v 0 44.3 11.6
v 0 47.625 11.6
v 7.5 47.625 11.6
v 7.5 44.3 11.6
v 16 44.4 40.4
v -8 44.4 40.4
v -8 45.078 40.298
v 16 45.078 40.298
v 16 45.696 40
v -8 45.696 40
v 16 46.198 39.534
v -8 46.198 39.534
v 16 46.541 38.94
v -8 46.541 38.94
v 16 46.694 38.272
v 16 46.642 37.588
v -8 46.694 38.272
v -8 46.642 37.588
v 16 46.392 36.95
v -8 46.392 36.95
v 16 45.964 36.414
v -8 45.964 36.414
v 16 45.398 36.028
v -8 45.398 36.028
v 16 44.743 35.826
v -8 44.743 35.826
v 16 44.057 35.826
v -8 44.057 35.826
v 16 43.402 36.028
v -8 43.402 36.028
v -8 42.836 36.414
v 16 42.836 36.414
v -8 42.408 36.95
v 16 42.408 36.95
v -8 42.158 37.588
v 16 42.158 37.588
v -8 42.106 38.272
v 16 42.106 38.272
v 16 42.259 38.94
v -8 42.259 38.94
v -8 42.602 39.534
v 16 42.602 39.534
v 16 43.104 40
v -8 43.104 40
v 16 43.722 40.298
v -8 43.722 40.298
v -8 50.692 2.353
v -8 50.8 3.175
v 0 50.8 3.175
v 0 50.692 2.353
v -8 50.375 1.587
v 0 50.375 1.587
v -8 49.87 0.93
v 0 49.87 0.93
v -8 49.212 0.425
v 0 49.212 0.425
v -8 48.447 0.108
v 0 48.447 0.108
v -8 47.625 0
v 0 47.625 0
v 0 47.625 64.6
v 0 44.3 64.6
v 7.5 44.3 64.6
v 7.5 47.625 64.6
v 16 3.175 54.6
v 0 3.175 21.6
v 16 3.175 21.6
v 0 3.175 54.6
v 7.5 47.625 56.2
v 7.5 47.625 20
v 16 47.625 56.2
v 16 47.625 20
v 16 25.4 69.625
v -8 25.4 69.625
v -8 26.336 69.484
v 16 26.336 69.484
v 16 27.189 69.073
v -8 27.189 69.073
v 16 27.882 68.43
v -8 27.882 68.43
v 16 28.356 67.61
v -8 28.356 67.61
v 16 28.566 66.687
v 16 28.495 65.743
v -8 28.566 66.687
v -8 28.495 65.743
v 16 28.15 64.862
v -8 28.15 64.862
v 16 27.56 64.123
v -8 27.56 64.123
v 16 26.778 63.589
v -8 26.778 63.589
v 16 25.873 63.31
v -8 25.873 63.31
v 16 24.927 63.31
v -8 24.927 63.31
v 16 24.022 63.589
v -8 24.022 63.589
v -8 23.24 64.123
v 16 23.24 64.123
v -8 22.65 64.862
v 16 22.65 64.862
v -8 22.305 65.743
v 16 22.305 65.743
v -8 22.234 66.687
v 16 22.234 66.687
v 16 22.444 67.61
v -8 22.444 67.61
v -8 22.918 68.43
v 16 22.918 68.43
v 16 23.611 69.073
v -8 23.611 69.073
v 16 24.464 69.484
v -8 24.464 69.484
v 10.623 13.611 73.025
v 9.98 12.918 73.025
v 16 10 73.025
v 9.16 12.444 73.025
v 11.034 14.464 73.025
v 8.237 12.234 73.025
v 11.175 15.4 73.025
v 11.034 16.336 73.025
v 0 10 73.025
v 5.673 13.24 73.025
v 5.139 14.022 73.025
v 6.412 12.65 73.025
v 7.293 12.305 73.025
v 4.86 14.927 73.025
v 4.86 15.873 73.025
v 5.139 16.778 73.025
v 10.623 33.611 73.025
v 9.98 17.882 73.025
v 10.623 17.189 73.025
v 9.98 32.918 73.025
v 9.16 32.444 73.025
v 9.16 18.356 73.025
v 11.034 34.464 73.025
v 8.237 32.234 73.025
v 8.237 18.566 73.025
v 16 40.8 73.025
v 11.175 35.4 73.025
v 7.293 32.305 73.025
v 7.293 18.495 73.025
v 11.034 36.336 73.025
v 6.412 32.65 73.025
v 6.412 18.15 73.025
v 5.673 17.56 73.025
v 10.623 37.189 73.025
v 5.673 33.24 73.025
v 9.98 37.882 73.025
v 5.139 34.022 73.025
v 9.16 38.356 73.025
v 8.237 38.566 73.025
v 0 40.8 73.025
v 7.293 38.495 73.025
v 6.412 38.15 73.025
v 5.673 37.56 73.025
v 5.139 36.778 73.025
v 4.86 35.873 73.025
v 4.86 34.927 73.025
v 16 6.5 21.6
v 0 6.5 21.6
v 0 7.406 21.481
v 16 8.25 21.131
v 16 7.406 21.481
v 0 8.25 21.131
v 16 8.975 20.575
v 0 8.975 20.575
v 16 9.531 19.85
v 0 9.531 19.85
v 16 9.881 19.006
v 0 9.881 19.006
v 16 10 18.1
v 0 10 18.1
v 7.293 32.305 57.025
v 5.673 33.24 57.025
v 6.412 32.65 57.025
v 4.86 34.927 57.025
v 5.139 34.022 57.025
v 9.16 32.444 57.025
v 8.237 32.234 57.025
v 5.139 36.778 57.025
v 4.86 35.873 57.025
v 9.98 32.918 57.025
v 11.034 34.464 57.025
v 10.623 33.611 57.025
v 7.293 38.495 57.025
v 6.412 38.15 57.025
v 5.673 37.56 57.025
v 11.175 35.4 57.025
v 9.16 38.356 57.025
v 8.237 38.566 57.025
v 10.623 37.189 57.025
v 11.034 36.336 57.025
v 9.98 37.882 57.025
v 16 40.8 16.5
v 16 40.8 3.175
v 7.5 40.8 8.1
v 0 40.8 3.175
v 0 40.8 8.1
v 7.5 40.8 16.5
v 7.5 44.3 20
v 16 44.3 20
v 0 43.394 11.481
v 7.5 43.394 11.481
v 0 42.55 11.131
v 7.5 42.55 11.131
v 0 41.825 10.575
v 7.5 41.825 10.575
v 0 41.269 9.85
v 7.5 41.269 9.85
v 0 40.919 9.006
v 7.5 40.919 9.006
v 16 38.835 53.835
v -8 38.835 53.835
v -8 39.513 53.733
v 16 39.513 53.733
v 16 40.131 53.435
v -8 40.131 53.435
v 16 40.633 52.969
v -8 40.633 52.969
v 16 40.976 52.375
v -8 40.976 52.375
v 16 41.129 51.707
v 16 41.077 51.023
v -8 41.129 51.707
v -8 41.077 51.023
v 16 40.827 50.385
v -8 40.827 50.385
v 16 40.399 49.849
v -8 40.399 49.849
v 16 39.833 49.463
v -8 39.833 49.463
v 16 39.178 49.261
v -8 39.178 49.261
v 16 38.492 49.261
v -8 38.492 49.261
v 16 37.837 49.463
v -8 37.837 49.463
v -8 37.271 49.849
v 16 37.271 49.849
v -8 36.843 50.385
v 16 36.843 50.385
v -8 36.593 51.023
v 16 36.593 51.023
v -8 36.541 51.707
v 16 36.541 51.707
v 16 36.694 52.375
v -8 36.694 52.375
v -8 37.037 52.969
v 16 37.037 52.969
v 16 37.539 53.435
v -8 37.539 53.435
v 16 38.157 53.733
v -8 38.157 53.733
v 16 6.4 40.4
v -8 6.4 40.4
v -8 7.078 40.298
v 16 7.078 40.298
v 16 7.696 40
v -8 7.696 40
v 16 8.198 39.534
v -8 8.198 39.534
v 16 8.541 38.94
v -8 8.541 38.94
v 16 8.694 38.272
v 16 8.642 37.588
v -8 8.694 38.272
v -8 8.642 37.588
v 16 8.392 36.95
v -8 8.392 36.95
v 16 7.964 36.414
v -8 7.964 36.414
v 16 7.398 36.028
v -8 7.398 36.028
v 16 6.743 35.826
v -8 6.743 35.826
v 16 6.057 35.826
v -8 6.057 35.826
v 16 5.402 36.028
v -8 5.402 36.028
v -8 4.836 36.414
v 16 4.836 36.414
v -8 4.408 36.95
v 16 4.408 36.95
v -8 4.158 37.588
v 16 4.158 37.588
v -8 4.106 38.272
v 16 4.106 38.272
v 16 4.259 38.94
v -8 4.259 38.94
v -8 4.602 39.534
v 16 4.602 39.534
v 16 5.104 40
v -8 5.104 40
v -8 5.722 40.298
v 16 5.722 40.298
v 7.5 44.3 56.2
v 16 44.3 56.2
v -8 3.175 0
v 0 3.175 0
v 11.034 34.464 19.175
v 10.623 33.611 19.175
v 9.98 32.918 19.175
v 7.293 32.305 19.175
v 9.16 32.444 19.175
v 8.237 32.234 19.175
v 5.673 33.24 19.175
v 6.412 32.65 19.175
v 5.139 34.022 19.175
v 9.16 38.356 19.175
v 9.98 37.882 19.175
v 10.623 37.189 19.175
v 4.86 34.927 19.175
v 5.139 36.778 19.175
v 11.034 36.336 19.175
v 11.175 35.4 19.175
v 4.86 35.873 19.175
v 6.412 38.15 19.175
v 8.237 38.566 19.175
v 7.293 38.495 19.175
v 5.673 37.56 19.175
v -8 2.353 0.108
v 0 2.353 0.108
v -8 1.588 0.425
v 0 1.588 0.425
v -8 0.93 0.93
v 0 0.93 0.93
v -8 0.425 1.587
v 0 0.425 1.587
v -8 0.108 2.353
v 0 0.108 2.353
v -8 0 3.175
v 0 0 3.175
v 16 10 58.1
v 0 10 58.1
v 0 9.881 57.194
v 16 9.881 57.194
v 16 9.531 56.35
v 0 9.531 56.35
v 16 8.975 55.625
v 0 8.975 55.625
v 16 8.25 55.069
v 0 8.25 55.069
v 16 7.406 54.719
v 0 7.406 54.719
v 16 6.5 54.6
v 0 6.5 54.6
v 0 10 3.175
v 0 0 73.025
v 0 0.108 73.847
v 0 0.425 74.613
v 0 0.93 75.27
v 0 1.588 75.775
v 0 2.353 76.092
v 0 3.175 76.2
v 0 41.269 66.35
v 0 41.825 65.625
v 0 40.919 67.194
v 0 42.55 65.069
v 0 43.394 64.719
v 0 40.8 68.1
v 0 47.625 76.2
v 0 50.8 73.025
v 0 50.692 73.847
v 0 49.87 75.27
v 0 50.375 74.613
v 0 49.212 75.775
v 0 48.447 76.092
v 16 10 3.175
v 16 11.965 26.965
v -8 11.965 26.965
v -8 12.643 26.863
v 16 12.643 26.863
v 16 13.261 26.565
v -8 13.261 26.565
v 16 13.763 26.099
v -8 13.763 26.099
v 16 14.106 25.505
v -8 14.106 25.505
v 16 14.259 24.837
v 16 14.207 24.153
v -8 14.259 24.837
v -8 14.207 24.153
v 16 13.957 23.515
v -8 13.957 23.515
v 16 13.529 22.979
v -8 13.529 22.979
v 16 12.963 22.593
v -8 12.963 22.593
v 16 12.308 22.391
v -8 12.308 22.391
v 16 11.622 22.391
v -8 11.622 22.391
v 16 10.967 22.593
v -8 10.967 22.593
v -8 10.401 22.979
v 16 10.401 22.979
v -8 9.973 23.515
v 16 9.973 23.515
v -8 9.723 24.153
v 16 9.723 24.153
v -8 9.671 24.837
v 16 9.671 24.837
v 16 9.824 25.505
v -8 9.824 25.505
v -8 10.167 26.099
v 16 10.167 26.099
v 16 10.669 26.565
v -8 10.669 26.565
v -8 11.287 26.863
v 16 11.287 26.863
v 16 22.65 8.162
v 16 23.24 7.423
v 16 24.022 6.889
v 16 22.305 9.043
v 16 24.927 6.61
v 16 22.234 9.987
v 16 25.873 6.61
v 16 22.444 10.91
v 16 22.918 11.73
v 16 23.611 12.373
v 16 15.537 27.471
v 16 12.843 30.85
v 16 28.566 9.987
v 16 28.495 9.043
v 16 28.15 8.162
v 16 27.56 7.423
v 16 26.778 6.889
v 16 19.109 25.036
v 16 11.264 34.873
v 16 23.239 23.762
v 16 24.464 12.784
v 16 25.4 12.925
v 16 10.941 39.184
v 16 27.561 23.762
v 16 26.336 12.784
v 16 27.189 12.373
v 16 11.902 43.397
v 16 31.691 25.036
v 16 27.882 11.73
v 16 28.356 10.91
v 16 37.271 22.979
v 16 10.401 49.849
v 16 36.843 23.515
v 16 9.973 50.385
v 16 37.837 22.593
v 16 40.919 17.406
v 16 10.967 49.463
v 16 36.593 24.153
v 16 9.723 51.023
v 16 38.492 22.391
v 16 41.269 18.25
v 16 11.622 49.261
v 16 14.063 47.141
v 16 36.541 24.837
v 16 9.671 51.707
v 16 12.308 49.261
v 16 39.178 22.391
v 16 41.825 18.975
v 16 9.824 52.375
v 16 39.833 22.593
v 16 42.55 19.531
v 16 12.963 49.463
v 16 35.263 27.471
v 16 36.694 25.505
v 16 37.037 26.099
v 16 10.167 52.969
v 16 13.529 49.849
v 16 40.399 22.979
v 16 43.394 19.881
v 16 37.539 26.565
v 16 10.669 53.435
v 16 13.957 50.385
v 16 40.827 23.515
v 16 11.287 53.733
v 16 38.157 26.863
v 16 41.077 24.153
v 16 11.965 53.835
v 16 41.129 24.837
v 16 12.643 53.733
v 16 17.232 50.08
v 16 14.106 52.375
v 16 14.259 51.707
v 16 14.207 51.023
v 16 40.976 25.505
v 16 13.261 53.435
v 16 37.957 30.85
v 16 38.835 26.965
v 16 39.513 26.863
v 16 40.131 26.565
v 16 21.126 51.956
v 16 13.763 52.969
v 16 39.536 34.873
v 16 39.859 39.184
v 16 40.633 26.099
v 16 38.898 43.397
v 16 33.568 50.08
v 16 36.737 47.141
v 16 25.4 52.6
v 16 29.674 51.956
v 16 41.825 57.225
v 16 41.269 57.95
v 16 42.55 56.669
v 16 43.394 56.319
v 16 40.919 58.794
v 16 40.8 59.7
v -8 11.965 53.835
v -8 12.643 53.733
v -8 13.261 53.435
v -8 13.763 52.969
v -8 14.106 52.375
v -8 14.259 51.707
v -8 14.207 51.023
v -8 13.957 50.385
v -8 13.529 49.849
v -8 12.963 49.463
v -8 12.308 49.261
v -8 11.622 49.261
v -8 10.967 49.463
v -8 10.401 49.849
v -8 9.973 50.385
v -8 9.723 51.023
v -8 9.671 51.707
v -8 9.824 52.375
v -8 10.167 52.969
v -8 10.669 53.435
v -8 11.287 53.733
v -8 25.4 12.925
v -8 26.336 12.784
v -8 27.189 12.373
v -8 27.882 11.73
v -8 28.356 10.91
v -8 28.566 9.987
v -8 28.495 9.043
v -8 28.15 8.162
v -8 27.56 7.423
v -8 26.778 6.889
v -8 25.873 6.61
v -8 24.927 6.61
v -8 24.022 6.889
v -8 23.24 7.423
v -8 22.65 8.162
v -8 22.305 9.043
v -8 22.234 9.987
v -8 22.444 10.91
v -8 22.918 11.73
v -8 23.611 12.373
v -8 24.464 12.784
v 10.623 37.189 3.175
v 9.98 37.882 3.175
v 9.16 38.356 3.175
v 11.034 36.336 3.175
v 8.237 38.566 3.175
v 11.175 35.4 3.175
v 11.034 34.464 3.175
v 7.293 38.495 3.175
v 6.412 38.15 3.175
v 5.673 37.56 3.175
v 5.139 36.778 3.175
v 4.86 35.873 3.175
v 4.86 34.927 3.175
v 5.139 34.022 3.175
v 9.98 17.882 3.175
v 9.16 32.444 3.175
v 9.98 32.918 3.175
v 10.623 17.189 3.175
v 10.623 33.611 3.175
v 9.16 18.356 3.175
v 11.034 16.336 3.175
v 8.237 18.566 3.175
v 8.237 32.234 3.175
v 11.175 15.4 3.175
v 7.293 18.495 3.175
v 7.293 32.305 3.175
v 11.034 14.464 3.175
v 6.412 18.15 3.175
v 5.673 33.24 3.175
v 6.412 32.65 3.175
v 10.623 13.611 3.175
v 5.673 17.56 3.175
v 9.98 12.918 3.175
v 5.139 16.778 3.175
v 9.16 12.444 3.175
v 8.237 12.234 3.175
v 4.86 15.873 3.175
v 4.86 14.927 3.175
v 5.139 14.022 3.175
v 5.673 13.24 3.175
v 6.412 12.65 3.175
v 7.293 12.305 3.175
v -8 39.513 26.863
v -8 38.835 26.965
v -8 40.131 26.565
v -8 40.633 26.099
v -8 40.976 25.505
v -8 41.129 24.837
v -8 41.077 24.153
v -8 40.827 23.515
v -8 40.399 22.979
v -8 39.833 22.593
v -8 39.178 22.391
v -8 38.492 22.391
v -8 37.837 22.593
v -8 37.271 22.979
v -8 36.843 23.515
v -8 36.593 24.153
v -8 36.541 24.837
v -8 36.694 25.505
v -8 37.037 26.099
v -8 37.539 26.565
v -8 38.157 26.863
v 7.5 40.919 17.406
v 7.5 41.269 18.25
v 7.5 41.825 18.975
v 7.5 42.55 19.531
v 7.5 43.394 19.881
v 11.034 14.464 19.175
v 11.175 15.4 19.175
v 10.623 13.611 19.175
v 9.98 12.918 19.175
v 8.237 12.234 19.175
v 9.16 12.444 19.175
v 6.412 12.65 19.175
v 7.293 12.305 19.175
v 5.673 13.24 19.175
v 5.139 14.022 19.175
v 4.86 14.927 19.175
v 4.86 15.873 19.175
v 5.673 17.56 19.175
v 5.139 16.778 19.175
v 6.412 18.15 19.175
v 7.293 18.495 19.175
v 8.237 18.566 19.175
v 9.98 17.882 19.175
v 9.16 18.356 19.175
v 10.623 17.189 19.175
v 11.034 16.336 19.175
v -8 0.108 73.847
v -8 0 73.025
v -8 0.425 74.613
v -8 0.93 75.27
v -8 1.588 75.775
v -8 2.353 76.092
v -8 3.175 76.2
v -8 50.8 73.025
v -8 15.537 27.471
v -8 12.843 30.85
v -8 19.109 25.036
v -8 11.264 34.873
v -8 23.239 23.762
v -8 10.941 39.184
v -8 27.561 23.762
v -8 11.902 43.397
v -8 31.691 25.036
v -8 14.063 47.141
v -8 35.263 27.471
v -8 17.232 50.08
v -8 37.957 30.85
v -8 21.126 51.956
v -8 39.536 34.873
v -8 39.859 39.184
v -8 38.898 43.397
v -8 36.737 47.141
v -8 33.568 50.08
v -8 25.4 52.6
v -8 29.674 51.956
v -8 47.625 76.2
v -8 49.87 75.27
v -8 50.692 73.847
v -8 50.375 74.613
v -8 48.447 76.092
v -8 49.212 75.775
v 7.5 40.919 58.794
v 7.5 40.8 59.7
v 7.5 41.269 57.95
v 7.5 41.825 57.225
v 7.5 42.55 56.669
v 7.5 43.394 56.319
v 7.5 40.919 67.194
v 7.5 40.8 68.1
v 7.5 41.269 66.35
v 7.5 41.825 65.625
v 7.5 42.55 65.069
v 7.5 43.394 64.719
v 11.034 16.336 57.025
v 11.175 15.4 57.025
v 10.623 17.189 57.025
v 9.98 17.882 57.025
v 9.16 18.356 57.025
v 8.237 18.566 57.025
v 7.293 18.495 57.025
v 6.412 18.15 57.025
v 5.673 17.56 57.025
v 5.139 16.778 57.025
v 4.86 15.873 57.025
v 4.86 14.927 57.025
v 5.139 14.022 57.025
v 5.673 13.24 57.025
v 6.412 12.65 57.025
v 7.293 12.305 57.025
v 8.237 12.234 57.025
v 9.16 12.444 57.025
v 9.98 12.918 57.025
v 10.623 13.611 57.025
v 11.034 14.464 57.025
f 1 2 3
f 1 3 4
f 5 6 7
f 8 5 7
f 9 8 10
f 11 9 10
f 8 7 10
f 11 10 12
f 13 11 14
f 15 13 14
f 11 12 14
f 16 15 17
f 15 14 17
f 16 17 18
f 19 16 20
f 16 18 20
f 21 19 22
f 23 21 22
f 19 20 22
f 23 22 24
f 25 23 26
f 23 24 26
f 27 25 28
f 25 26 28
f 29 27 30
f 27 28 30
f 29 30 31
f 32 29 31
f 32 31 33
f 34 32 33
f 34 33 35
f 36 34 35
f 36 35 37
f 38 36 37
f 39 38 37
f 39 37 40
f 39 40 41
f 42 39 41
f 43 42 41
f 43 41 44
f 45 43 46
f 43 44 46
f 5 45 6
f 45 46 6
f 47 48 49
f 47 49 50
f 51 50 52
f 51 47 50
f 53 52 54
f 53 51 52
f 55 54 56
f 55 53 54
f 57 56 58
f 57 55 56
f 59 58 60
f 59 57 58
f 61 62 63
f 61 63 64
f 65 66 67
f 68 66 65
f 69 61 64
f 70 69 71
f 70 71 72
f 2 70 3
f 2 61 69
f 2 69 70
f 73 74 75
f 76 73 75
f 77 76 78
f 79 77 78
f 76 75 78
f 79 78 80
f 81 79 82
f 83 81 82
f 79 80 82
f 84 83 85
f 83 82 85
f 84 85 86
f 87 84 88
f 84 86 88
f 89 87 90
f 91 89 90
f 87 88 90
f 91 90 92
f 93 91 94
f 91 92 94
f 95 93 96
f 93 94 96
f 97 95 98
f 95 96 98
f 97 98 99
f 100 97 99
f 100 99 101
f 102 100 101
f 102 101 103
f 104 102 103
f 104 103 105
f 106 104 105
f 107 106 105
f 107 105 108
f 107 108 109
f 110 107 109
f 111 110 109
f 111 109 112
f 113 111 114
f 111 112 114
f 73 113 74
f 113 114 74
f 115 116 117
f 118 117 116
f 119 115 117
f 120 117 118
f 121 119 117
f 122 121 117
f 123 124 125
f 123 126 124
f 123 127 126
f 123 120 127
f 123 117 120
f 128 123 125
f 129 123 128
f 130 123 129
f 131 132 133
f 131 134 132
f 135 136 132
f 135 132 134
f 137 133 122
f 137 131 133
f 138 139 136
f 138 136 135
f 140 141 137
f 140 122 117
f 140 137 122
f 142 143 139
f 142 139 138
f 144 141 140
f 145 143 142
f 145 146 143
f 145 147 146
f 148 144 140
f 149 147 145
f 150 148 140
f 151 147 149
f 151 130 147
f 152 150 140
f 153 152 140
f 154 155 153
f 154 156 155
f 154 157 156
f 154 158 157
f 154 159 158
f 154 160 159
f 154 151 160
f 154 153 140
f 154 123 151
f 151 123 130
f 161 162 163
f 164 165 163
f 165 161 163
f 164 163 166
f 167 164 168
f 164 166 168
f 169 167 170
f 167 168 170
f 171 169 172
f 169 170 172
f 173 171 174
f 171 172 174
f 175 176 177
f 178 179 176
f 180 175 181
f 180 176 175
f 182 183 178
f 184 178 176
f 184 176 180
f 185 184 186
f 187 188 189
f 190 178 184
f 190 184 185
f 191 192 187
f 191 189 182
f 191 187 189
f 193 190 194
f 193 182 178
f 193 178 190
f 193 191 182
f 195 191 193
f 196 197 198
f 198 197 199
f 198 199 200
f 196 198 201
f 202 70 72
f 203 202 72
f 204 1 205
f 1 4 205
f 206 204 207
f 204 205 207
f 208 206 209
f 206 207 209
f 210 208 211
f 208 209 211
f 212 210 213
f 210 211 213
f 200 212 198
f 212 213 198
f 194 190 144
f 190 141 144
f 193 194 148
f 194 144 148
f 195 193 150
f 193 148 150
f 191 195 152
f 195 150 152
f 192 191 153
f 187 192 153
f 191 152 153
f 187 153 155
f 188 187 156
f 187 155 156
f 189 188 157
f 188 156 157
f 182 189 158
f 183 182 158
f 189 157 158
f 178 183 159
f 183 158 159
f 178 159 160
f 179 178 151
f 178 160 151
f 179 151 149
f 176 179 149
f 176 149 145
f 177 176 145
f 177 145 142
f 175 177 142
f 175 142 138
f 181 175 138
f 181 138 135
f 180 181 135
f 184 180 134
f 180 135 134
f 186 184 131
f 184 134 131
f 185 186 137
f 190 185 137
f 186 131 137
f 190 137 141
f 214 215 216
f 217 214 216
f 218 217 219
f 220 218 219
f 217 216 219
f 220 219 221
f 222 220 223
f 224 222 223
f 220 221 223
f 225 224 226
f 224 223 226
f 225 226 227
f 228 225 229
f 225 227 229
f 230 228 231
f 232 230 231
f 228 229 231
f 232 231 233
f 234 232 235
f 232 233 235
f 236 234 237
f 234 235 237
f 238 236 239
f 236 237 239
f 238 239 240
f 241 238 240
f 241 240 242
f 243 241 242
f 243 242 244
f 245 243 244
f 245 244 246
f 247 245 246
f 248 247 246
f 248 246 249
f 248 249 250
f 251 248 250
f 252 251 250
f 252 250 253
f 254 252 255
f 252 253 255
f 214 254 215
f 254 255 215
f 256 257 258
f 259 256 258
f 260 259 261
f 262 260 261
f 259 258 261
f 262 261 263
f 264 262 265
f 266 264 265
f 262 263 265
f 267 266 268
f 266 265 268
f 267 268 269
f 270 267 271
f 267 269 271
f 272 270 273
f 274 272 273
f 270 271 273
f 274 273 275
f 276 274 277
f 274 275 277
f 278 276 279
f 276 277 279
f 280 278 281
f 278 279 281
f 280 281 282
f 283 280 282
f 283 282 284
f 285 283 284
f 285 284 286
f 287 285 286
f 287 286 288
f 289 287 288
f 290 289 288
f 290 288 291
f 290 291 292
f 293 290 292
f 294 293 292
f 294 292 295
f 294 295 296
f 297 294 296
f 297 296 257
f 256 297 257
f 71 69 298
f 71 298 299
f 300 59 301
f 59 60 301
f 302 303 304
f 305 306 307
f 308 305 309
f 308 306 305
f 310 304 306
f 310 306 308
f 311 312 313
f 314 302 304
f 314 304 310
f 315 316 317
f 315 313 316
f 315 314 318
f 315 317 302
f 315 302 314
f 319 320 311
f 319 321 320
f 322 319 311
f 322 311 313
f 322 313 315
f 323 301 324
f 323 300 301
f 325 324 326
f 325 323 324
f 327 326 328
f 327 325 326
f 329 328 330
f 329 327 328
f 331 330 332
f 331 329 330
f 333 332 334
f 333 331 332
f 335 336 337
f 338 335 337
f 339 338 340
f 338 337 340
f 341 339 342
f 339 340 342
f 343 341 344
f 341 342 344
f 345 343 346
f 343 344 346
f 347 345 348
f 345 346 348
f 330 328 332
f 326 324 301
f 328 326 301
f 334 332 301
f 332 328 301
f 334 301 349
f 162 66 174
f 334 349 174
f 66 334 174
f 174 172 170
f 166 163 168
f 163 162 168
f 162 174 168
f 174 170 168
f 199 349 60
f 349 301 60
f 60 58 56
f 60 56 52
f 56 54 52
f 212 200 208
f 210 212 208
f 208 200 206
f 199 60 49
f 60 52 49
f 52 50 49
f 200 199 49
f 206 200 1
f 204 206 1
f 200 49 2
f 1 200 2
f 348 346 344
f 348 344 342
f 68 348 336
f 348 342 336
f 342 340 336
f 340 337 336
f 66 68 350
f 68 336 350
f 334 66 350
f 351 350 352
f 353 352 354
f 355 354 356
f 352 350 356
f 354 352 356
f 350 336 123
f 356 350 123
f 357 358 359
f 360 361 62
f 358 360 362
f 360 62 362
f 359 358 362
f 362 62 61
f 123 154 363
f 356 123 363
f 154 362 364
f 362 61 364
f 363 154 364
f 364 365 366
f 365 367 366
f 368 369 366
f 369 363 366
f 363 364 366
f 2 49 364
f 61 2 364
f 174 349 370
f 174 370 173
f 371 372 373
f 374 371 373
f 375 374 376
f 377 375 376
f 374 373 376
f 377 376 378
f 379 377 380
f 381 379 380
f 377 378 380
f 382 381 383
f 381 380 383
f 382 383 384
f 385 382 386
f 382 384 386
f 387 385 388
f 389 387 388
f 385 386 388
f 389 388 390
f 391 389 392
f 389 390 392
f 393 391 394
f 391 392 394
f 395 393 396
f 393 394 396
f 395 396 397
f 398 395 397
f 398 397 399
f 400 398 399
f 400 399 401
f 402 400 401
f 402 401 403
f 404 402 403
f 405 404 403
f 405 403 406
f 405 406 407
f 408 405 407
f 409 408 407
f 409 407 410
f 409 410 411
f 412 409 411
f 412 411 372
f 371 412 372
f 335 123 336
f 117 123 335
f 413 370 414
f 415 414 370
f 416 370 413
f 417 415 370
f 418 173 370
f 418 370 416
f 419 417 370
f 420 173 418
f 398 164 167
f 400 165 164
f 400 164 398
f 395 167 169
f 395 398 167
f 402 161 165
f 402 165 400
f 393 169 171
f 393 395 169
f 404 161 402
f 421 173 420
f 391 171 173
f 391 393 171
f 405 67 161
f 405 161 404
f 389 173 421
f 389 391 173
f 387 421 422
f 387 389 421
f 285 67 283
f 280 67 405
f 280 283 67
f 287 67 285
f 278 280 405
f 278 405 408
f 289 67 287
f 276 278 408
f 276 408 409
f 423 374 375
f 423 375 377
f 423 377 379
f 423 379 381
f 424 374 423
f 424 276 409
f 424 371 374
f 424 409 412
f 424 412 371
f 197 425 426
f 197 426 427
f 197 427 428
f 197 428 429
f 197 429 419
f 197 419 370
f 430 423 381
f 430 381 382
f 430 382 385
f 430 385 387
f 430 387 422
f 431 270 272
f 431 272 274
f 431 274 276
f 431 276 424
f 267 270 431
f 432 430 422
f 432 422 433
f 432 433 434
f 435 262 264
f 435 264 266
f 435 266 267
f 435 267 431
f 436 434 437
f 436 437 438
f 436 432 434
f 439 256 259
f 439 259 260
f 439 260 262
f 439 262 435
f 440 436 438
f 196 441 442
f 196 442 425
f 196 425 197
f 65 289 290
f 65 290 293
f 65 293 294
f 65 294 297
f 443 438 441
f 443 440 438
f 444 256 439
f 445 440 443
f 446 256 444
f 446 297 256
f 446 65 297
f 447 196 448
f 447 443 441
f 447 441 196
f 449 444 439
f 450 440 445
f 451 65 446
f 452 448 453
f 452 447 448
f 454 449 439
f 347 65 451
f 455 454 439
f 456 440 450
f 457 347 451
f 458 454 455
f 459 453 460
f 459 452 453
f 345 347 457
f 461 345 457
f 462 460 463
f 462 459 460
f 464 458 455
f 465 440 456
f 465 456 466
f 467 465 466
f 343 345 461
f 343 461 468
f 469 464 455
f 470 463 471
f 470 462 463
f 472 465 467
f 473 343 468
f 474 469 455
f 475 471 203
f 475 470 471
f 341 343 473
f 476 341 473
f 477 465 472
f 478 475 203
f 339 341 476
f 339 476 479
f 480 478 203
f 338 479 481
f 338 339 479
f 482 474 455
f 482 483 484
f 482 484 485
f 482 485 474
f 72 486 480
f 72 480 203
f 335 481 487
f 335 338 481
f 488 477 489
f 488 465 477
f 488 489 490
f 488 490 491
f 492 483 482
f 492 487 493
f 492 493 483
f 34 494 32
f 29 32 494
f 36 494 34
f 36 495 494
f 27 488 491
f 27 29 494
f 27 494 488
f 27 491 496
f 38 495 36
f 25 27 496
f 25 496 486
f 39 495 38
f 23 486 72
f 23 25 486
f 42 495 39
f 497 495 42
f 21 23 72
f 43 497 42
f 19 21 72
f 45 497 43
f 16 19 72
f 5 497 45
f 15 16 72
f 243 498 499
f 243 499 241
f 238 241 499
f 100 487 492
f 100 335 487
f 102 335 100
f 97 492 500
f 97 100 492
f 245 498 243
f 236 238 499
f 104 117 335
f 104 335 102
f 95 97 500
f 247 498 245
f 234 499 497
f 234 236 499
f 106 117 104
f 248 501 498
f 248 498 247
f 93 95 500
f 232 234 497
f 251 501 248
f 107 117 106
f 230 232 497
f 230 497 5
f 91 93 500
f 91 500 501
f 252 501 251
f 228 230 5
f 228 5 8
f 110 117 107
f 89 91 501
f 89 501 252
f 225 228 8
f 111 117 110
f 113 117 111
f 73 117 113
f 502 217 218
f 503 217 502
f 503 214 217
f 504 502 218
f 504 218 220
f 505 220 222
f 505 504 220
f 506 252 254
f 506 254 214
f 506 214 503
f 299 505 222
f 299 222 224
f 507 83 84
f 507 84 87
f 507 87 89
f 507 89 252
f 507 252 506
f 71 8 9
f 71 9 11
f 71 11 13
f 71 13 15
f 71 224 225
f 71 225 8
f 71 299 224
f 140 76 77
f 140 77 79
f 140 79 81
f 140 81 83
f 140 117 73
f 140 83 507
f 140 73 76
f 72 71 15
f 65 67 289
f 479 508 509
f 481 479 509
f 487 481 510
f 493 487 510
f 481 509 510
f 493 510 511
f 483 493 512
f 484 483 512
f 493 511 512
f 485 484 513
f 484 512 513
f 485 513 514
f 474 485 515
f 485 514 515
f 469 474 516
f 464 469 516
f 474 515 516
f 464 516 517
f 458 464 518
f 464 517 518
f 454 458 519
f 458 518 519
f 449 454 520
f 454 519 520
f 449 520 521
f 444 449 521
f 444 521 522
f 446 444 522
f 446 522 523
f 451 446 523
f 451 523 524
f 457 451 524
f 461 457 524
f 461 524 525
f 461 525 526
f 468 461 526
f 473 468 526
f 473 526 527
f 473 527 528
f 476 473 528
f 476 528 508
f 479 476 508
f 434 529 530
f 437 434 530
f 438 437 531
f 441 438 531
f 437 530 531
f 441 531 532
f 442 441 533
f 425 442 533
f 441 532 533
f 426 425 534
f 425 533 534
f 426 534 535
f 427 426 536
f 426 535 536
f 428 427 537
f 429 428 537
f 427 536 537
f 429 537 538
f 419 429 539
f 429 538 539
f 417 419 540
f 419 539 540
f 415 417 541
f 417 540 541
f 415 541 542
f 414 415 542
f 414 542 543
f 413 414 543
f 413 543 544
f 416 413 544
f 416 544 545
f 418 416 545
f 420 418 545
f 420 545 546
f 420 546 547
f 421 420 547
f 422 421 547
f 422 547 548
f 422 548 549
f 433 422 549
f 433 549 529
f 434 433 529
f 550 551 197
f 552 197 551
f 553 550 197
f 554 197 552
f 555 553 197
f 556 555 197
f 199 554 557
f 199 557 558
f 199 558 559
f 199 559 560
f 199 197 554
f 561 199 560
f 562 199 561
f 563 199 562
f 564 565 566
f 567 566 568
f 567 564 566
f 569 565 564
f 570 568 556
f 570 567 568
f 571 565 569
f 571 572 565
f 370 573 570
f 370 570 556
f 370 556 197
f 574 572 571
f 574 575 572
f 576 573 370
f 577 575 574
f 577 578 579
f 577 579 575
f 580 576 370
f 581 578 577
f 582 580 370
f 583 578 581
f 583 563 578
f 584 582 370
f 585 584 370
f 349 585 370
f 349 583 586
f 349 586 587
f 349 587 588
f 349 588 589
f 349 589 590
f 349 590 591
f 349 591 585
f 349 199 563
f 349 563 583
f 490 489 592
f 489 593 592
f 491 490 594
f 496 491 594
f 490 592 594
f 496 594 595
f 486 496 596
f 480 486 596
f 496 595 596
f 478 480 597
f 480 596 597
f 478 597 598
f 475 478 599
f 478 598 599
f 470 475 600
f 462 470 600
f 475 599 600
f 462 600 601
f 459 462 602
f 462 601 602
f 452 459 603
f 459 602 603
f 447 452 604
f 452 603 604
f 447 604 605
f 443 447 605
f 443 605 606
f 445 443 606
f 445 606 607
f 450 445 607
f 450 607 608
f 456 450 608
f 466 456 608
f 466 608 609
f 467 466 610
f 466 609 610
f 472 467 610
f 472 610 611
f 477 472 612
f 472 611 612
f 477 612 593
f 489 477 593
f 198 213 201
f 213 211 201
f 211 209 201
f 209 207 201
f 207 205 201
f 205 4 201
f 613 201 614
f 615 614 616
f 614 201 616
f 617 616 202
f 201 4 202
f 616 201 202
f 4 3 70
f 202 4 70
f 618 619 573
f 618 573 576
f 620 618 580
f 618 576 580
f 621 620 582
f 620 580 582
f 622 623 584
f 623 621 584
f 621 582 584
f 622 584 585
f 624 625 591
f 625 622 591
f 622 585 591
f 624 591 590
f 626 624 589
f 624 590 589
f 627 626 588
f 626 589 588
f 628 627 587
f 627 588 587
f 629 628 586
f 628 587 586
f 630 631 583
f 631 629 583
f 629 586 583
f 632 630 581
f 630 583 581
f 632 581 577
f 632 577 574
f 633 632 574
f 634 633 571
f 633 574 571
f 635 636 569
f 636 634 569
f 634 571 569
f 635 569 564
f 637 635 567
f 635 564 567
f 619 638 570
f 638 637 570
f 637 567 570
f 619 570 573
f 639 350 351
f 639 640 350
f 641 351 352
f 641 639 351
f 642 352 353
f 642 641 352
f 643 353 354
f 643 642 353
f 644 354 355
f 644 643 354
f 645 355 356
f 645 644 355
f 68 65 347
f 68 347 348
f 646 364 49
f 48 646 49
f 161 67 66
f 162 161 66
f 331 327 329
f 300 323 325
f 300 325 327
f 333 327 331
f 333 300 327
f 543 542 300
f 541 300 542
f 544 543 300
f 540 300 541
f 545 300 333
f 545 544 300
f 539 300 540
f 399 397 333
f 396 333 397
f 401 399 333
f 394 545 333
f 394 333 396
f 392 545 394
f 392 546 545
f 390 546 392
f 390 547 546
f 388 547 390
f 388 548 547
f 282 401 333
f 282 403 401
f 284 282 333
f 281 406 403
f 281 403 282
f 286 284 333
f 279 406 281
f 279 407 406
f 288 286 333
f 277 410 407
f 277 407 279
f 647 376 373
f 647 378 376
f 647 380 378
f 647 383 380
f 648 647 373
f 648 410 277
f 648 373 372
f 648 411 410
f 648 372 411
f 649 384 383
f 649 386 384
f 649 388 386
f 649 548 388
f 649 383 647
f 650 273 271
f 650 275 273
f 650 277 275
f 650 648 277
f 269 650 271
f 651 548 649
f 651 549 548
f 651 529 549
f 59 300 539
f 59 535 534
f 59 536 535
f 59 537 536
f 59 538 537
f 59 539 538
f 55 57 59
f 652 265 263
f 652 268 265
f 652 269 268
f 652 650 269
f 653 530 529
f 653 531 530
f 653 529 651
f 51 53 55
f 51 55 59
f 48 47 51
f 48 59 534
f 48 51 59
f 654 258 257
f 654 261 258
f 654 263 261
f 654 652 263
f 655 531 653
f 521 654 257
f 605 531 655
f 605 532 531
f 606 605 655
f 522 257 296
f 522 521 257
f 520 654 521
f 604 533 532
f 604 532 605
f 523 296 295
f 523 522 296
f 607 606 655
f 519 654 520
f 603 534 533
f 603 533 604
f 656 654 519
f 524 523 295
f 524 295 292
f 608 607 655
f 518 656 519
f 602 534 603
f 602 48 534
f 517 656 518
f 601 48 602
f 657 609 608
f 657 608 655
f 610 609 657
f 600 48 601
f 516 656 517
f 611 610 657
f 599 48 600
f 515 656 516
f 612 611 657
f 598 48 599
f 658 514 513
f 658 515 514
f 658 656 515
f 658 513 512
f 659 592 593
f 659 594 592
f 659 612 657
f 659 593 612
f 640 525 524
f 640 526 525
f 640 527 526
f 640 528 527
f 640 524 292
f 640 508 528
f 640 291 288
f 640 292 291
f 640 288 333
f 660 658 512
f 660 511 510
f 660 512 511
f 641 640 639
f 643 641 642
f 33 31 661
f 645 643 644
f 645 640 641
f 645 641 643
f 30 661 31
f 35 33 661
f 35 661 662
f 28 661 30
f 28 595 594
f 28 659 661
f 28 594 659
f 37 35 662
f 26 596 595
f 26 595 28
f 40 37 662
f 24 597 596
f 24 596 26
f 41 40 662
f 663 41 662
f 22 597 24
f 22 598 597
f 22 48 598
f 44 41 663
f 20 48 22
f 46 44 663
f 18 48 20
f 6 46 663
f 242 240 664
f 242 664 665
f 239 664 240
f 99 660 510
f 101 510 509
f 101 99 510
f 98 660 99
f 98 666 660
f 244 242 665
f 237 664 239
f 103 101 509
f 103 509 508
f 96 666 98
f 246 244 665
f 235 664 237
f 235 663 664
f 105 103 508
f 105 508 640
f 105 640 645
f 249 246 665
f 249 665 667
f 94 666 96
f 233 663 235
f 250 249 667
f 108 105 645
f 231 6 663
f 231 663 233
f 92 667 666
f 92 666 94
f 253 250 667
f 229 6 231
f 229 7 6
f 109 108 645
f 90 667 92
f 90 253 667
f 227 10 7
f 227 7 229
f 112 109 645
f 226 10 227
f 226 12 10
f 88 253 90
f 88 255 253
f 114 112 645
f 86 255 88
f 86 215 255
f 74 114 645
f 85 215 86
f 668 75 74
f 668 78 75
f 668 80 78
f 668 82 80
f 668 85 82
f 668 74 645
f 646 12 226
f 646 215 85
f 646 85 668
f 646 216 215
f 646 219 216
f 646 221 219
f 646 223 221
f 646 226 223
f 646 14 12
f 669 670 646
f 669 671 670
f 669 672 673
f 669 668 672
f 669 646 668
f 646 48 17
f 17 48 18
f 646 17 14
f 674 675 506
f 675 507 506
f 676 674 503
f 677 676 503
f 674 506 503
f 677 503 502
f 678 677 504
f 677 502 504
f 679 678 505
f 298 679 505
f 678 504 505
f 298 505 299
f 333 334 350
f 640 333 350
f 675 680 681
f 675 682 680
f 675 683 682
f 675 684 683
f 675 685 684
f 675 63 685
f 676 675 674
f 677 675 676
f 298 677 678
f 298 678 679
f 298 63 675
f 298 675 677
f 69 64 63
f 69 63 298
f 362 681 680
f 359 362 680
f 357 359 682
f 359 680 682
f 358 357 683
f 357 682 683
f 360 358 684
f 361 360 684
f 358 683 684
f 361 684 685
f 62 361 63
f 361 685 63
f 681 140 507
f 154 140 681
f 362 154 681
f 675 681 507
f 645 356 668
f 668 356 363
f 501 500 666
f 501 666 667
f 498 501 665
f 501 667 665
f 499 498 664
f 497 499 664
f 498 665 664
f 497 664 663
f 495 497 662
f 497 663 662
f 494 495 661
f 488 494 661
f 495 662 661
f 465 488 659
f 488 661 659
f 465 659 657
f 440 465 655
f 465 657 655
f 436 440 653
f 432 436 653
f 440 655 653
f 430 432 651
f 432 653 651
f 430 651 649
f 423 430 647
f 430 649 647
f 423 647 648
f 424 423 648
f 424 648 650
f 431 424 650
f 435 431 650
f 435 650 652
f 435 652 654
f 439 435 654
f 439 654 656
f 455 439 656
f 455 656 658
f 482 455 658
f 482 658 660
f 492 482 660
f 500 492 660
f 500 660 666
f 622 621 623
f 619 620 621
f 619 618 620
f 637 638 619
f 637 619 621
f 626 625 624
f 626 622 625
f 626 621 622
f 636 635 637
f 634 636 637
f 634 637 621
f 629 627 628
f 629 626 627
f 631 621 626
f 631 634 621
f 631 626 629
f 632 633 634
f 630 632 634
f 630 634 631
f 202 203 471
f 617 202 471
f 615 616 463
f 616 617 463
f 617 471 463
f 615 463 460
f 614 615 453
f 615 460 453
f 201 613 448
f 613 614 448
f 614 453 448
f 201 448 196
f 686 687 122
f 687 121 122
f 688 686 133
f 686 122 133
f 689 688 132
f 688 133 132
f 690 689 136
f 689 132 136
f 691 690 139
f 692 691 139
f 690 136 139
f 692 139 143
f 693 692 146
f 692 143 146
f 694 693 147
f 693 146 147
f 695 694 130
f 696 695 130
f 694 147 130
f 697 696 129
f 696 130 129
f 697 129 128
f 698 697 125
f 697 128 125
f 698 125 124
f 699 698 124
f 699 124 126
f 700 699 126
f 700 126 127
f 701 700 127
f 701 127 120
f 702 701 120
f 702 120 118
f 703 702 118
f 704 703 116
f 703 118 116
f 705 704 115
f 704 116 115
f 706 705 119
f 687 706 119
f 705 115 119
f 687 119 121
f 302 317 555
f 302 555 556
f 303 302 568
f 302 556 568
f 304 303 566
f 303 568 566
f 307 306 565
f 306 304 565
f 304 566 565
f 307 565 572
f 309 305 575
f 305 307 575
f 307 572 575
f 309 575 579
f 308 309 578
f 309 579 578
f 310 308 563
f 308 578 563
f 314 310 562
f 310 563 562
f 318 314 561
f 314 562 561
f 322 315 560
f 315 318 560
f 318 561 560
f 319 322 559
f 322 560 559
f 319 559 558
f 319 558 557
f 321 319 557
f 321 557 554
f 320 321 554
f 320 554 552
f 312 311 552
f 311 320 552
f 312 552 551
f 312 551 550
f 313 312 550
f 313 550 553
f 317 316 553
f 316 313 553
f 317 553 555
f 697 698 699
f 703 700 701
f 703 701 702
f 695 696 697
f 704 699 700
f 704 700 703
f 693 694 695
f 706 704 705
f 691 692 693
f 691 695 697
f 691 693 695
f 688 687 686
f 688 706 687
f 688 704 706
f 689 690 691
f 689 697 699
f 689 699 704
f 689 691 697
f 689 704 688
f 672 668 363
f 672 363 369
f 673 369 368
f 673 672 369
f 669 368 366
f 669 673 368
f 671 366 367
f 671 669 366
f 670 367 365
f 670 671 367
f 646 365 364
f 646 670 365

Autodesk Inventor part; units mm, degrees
ref_plane "YZ Plane" through (0, 0, 0) normal (1, 0, 0) x (0, 1, 0)
ref_plane "XZ Plane" through (0, 0, 0) normal (0, 1, 0) x (-1, 0, 0)
sketch "Sketch1" plane through (0, 0, 0) normal (1, 0, 0) x (0, 1, 0)
  line L0 (0, 0) -> (50.8, 0) construction
  line L1 (50.8, 0) -> (50.8, 76.2) construction
  line L2 (50.8, 76.2) -> (0, 76.2) construction
  line L3 (0, 76.2) -> (0, 0) construction
  line L4 (40.8, 3.175) -> (10, 3.175)
  line L5 (10, 3.175) -> (10, 11.6)
  line L6 (10, 11.6) -> (3.175, 11.6)
  line L7 (3.175, 11.6) -> (3.175, 64.6)
  line L8 (3.175, 64.6) -> (10, 64.6)
  line L9 (10, 64.6) -> (10, 73.025)
  line L10 (10, 73.025) -> (40.8, 73.025)
  line L11 (40.8, 73.025) -> (40.8, 64.6)
  line L12 (40.8, 64.6) -> (47.625, 64.6)
  line L13 (47.625, 64.6) -> (47.625, 11.6)
  line L14 (47.625, 11.6) -> (40.8, 11.6)
  line L15 (40.8, 3.175) -> (40.8, 11.6)
  line L16 (25.4, 73.025) -> (25.4, 76.2) construction
  line L17 (47.625, 38.1) -> (50.8, 38.1) construction
  line L18 (3.175, 38.1) -> (0, 38.1) construction
  line L19 (25.4, 3.175) -> (25.4, 0) construction
  point P0 (1.5875, 38.1)
  dimension "d0" = 50.8
  dimension "d1" = 76.2
  dimension "d2" = 3.175
  dimension "d3" = 26.5
  dimension "d4" = 10
extrude "Extrusion1" add sketch "Sketch1" along normal blind 16
sketch "Sketch2" plane through (0, 10, 73.025) normal (0, 0, 1) x (1, 0, 0)
  line L0 (0, -10) -> (16, -10) construction
  line L1 (16, -10) -> (16, 40.8) construction
  line L2 (16, 40.8) -> (0, 40.8) construction
  line L3 (0, 40.8) -> (0, -10) construction
  circle A0 centre (8, 25.4) radius 3.175
  circle A1 centre (8, 5.4) radius 3.175
  line L4 (8, 25.4) -> (8, 40.8) construction
  line L5 (8, 5.4) -> (8, -10) construction
  dimension "d7" = 16
  dimension "d8" = 50.8
  dimension "d9" = 6.35
  dimension "d10" = 20
extrude "Extrusion2" cut sketch "Sketch2" against normal blind 16
ref_plane "Work Plane1" through (0, 10, 38.1) normal (0, 0, 1) x (1, 0, 0)
mirror "Mirror1" about plane through (0, 10, 38.1) normal (0, 0, 1) of "Extrusion2"
sketch "Sketch5" plane through (0, 47.625, 64.6) normal (0, 1, 0) x (1, 0, 0)
  line L0 (0, 64.6) -> (16, 64.6) construction
  line L1 (16, 64.6) -> (16, -11.6) construction
  line L2 (16, -11.6) -> (0, -11.6) construction
  line L3 (0, -11.6) -> (0, 64.6) construction
  line L4 (12.5, 3.4) -> (12.5, -11.6) construction
  line L5 (12.5, 49.6) -> (12.5, 64.6) construction
  line L6 (7.5, 8.4) -> (16, 8.4)
  line L7 (16, 8.4) -> (16, -11.6)
  line L8 (16, -11.6) -> (7.5, -11.6)
  line L9 (7.5, -11.6) -> (7.5, 8.4)
  line L10 (12.5, 3.4) -> (7.5, 3.4) construction
  line L11 (12.5, 3.4) -> (16, 3.4) construction
  line L12 (12.5, 3.4) -> (12.5, 8.4) construction
  line L13 (7.5, 44.6) -> (16, 44.6)
  line L14 (16, 44.6) -> (16, 64.6)
  line L15 (16, 64.6) -> (7.5, 64.6)
  line L16 (7.5, 64.6) -> (7.5, 44.6)
  line L17 (12.5, 49.6) -> (12.5, 44.6) construction
  line L18 (12.5, 49.6) -> (7.5, 49.6) construction
  dimension "d18" = 76.2
  dimension "d19" = 16
  dimension "d21" = 15
  dimension "d22" = 12.5
  dimension "d23" = 5
extrude "Extrusion4" cut sketch "Sketch5" against normal up to surface (6.825 mm away)
sketch "Sketch6" plane through (0, 3.175, 11.6) normal (0, -1, 0) x (1, 0, 0)
  line L0 (0, -11.6) -> (16, -11.6) construction
  line L1 (16, -11.6) -> (16, 64.6) construction
  line L2 (16, 64.6) -> (0, 64.6) construction
  line L3 (0, 64.6) -> (0, -11.6) construction
  line L4 (10, 53) -> (10, 0) construction
  line L5 (10, 26.5) -> (0, 26.5) construction
  line L6 (16, 43) -> (0, 43)
  line L7 (0, 43) -> (0, 64.6)
  line L8 (0, 64.6) -> (16, 64.6)
  line L9 (16, 64.6) -> (16, 43)
  line L10 (16, 10) -> (0, 10)
  line L11 (0, 10) -> (0, -11.6)
  line L12 (0, -11.6) -> (16, -11.6)
  line L13 (16, -11.6) -> (16, 10)
  dimension "d26" = 16
  dimension "d27" = 76.2
  dimension "d28" = 10
  dimension "d29" = 53
  dimension "d30" = 10
extrude "Extrusion5" cut sketch "Sketch6" against normal up to surface (6.825 mm away)
fillet "Fillet1" radius 3.5 6 edges at (8, 10, 54.6) (3.75, 40.8, 64.6) (11.75, 40.8, 56.2) (3.75, 40.8, 11.6) (11.75, 40.8, 20) (8, 10, 21.6)
sketch "Sketch4" plane through (0, 0, 0) normal (-1, 0, 0) x (0, 0, 1)
  line L0 (0, 0) -> (76.2, 0)
  line L1 (76.2, 0) -> (76.2, 50.8)
  line L2 (76.2, 50.8) -> (0, 50.8)
  line L3 (0, 50.8) -> (0, 0)
  dimension "d13" = 76.2
  dimension "d14" = 50.8
extrude "Extrusion3" add sketch "Sketch4" along normal blind 8
sketch "Sketch7" plane through (-8, 0, 0) normal (-1, 0, 0) x (0, 0, 1)
  circle A0 centre (38.1, 25.4) radius 14.5
  circle A1 centre (38.1, 25.4) radius 19 construction
  circle A2 centre (24.665, 38.835) radius 2.3
  circle A3 centre (38.1, 44.4) radius 2.3
  circle A4 centre (24.665, 11.965) radius 2.3
  circle A5 centre (38.1, 6.4) radius 2.3
  circle A6 centre (51.535, 38.835) radius 2.3
  circle A7 centre (51.535, 11.965) radius 2.3
  line L0 (51.535, 38.835) -> (38.1, 25.4) construction
  line L1 (38.1, 25.4) -> (38.1, 44.4) construction
  line L2 (0, 0) -> (76.2, 0) construction
  line L3 (76.2, 0) -> (76.2, 50.8) construction
  line L4 (76.2, 50.8) -> (0, 50.8) construction
  line L5 (0, 50.8) -> (0, 0) construction
  circle A8 centre (9.75, 25.4) radius 3.175
  circle A9 centre (66.45, 25.4) radius 3.175
  line L6 (9.75, 25.4) -> (0, 25.4) construction
  line L7 (66.45, 25.4) -> (76.2, 25.4) construction
  circle A10 centre (38.1, 25.4) radius 25 construction
  line L8 (18.1, 25.4) -> (9.75, 25.4) construction
  line L9 (38.1, 25.4) -> (18.1, 25.4) construction
  point P0 (38.1, 50.8)
  dimension "d37" = 29
  dimension "d38" = 38
  dimension "d39" = 4.6
  dimension "d40" = 45
  dimension "d41" = 76.2
  dimension "d42" = 50.8
  dimension "d43" = 6.35
  dimension "d44" = 6.35
  dimension "d45" = 50
  dimension "d51" = 20
  dimension "d52" = 8.35
extrude "Extrusion6" cut sketch "Sketch7" against normal through all
fillet "Fillet2" radius 3.175 4 edges at (-4, 50.8, 0) (-4, 50.8, 76.2) (-4, 0, 76.2) (-4, 0, 0)
properties part number "BS_Face" material "Aluminum 6061"
